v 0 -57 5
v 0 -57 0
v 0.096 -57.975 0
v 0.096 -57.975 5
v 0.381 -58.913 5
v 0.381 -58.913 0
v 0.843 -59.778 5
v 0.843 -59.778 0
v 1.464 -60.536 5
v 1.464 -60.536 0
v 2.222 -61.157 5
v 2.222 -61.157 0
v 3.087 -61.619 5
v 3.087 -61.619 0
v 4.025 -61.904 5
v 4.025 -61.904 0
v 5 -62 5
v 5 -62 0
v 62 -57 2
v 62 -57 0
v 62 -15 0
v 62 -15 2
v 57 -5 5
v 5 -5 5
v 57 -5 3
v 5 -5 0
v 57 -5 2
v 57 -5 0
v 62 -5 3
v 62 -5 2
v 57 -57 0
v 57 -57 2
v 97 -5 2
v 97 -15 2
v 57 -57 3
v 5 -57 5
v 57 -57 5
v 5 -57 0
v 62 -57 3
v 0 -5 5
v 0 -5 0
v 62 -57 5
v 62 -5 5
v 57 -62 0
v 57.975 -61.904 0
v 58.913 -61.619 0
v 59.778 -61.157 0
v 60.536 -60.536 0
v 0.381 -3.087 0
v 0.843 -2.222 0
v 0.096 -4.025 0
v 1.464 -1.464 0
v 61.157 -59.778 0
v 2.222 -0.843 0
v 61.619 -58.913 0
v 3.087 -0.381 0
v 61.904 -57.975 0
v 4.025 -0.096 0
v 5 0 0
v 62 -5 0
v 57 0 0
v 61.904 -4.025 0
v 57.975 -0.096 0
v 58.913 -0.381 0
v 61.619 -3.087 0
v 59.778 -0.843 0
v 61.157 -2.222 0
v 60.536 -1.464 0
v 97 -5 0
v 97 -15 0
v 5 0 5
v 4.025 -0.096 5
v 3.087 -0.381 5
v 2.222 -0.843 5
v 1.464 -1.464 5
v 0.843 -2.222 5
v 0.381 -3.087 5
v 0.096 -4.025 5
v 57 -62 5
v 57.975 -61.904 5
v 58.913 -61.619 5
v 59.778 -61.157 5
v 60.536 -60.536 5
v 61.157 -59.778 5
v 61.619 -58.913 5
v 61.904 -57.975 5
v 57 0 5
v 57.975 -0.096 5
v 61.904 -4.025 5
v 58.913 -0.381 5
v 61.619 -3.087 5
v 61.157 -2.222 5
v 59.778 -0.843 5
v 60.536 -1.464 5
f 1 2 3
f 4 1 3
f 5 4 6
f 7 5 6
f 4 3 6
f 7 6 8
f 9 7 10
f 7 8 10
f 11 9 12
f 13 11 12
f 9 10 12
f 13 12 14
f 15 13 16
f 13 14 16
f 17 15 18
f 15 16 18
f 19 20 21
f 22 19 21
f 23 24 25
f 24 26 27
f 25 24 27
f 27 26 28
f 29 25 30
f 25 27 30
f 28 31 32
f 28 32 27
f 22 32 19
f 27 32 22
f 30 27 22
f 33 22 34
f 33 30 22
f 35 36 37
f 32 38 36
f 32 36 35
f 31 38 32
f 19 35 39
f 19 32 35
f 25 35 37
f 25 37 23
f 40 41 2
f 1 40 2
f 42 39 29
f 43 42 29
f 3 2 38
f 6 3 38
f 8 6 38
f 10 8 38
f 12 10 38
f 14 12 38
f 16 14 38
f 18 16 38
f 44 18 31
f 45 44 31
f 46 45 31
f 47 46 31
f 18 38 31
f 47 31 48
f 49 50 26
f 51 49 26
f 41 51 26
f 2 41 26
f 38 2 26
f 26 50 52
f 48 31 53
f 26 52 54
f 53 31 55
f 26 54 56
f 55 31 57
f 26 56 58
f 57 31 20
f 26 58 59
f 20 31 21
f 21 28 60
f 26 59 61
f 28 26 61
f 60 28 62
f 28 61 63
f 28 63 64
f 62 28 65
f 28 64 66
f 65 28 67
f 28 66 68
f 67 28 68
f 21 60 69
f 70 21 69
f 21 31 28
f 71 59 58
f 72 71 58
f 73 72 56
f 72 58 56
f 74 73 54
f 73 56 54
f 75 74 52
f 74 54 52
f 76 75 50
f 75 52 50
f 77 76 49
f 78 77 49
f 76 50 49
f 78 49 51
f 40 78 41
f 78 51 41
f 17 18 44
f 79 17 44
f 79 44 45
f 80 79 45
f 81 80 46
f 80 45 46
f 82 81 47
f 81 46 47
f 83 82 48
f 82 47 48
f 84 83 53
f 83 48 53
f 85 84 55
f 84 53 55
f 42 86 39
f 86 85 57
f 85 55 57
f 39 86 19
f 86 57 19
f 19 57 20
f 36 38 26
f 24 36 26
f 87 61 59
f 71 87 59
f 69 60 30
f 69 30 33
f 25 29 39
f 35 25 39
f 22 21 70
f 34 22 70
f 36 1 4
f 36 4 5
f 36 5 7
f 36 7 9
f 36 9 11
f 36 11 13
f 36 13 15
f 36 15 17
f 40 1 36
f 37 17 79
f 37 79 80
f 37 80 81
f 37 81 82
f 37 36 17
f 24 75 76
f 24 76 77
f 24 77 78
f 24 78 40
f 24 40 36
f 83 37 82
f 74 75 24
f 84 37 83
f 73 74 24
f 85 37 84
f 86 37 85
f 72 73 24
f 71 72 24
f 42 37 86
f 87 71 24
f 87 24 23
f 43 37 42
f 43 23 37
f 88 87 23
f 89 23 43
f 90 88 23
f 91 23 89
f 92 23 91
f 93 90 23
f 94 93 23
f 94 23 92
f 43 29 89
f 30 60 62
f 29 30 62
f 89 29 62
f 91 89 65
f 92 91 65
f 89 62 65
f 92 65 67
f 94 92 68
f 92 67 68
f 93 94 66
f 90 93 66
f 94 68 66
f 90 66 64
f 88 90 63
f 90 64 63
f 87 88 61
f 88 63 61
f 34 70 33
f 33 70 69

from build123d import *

# Parameters (mm, degrees)
F0_W     = 52
F0_H     = 52
F1_DEPTH = 5
F0_W_2   = 35
F0_H_2   = 10
F2_DEPTH = 2
F4_DEPTH = 5


with BuildPart() as f1:
    # F0 (on Top) → F1 (new body)
    with BuildSketch(Plane.XY):
        with BuildLine():
            Line((57, 0), (5, 0))
            ThreePointArc((5, 0), (1.464466, -1.464466), (0, -5))
            Line((0, -5), (0, -57))
            ThreePointArc((0, -57), (1.464466, -60.535534), (5, -62))
            Line((5, -62), (57, -62))
            ThreePointArc((57, -62), (60.535534, -60.535534), (62, -57))
            Line((62, -57), (62, -15))
            Line((62, -15), (62, -5))
            ThreePointArc((62, -5), (60.535534, -1.464466), (57, 0))
        make_face()
        with Locations((31, -31)):
            Rectangle(F0_W, F0_H, mode=Mode.SUBTRACT)
    extrude(amount=F1_DEPTH)

    # F0 (on Top) → F2 (join)
    with BuildSketch(Plane.XY):
        with Locations((79.5, -10)):
            Rectangle(F0_W_2, F0_H_2)
    extrude(amount=F2_DEPTH)

    # F3 (on face) → F4 (cut, through all)
    with BuildSketch(Plane.YZ.offset(62)):
        Polygon((-15, 2), (-5, 2), (-5, 3), (-57, 3), (-57, 2), align=None)
    extrude(amount=-F4_DEPTH, mode=Mode.SUBTRACT)


solid = f1.part
